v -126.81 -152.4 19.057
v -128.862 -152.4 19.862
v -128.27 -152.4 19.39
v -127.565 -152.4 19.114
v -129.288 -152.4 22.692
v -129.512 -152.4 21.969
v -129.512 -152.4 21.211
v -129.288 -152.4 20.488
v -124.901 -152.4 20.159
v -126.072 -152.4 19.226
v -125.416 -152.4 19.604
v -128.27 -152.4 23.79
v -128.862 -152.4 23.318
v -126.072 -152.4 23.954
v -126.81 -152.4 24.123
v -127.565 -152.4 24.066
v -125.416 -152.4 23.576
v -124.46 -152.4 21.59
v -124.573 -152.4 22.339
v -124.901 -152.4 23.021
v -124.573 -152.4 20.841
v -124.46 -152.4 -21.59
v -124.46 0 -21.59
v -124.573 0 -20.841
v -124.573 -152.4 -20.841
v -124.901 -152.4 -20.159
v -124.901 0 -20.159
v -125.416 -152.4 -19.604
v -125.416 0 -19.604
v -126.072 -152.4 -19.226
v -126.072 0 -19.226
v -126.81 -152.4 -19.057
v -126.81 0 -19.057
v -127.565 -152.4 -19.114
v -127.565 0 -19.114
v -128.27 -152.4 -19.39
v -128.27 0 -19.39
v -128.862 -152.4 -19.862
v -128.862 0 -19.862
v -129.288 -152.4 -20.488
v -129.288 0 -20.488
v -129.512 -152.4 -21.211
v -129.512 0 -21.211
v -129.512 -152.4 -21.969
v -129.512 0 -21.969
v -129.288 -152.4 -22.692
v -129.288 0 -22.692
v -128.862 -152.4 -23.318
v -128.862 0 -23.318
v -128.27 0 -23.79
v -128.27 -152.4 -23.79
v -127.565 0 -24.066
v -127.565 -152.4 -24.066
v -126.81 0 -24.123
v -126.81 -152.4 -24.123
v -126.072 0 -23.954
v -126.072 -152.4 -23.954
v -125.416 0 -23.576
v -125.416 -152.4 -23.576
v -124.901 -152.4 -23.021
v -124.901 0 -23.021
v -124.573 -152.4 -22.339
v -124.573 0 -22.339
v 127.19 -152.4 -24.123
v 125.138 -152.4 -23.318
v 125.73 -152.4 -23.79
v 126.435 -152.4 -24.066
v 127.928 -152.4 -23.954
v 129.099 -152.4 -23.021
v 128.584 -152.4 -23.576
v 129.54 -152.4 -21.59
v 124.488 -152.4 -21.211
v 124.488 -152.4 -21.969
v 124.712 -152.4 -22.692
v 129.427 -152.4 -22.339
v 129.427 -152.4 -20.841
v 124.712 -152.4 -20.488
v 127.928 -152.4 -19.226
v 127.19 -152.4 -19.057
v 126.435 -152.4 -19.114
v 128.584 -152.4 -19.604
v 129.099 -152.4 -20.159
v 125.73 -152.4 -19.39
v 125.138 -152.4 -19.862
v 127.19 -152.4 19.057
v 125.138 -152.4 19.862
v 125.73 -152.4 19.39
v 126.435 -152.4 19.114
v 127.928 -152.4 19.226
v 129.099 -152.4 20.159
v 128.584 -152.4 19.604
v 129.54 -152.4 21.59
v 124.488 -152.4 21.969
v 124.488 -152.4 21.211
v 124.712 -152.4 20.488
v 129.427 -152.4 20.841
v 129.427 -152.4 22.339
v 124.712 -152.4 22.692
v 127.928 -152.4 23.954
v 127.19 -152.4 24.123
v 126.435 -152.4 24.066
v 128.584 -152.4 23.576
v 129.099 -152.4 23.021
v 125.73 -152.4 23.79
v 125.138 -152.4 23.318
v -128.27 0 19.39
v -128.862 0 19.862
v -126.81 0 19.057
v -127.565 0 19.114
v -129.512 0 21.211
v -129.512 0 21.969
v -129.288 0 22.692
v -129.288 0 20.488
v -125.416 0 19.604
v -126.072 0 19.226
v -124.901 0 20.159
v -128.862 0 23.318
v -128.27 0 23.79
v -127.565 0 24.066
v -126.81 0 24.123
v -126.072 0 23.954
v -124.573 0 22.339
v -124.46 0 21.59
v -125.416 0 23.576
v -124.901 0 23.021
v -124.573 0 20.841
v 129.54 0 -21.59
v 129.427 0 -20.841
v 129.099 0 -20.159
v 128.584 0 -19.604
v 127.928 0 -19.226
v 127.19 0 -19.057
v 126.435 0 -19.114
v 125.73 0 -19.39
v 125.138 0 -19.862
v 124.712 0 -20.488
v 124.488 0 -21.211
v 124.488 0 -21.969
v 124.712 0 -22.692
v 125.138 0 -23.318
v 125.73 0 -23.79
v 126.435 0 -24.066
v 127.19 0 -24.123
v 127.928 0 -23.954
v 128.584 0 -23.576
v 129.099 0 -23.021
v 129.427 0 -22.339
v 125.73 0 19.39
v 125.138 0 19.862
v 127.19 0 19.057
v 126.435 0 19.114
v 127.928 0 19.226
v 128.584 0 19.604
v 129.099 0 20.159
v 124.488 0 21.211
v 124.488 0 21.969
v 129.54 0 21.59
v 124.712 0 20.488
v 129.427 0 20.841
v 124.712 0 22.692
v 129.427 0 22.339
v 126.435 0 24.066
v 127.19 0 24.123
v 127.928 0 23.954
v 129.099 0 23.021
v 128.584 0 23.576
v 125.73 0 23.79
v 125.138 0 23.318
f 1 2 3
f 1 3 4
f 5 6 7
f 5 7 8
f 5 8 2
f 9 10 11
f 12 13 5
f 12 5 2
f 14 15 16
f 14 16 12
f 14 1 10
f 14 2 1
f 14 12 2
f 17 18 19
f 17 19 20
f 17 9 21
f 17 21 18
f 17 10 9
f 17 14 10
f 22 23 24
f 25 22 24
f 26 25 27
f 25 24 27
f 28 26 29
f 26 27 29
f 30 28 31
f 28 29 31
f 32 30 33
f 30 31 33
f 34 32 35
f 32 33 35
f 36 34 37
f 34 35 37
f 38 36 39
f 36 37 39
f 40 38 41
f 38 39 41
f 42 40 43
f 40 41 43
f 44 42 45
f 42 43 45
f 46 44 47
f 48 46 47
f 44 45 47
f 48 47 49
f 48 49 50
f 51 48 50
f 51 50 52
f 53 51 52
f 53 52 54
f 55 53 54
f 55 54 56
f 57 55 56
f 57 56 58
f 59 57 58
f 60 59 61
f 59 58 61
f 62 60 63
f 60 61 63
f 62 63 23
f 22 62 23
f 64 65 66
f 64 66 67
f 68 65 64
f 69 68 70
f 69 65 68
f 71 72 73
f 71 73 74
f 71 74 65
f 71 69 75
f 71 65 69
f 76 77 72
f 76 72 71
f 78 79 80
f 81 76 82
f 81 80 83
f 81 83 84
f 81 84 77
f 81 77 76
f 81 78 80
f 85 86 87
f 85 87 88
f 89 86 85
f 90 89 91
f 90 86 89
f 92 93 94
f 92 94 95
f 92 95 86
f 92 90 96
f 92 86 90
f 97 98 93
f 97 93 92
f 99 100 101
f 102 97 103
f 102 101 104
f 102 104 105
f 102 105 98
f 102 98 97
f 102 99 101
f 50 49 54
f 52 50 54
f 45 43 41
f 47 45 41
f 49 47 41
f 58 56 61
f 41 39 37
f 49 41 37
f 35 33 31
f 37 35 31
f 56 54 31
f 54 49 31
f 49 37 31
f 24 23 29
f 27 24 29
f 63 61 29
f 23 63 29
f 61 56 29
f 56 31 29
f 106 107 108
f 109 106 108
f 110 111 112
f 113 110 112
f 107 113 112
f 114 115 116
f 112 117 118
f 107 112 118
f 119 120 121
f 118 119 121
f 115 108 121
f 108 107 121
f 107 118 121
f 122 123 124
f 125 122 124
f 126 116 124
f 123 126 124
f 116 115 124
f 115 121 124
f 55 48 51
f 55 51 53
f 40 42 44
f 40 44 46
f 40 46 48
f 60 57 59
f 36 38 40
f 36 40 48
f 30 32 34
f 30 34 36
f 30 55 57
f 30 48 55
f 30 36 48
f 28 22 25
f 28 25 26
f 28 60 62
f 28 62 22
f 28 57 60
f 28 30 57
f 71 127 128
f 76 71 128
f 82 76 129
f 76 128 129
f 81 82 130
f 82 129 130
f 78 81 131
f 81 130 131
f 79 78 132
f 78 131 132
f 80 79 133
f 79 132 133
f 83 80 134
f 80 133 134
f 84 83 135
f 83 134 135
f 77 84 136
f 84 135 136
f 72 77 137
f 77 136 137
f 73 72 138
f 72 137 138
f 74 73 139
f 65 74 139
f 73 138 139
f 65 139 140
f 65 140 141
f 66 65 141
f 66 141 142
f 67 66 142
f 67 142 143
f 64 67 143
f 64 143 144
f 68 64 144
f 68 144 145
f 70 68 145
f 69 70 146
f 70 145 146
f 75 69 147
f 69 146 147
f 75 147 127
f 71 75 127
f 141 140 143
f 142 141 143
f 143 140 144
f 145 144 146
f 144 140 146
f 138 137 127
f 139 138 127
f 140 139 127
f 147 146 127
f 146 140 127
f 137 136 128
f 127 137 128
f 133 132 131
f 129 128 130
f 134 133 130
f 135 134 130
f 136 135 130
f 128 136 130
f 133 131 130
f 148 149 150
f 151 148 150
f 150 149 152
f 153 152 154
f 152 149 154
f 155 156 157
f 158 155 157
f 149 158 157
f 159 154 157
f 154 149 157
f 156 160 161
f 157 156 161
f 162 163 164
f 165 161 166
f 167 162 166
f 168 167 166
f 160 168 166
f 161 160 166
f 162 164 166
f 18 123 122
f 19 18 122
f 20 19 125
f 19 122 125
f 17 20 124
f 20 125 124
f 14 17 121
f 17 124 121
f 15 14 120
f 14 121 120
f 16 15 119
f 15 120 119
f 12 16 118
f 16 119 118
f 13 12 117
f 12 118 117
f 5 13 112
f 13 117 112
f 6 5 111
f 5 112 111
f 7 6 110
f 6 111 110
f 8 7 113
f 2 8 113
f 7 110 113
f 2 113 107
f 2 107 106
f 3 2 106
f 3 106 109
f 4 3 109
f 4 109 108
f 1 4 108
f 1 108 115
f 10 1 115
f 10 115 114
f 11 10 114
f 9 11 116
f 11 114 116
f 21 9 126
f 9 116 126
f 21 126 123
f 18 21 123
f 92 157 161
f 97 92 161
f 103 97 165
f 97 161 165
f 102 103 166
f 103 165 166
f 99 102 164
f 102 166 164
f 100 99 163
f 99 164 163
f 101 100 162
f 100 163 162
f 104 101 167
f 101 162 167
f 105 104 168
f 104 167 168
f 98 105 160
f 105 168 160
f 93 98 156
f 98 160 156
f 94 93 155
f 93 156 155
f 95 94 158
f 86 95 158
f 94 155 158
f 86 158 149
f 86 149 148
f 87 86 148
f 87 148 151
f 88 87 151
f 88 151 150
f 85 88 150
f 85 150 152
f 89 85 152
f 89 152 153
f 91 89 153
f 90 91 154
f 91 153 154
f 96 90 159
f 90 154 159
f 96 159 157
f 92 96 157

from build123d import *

# Parameters (mm, degrees)
F0_R     = 2.54
F1_DEPTH = 152.4


with BuildPart() as f1:
    # F0 (on Front) → F1 (new body)
    with BuildSketch(Plane.XZ):
        with Locations((-127, 21.59)):
            Circle(F0_R)
        with Locations((127, 21.59)):
            Circle(F0_R)
        with Locations((127, -21.59)):
            Circle(F0_R)
        with Locations((-127, -21.59)):
            Circle(F0_R)
    extrude(amount=F1_DEPTH)


solid = f1.part
